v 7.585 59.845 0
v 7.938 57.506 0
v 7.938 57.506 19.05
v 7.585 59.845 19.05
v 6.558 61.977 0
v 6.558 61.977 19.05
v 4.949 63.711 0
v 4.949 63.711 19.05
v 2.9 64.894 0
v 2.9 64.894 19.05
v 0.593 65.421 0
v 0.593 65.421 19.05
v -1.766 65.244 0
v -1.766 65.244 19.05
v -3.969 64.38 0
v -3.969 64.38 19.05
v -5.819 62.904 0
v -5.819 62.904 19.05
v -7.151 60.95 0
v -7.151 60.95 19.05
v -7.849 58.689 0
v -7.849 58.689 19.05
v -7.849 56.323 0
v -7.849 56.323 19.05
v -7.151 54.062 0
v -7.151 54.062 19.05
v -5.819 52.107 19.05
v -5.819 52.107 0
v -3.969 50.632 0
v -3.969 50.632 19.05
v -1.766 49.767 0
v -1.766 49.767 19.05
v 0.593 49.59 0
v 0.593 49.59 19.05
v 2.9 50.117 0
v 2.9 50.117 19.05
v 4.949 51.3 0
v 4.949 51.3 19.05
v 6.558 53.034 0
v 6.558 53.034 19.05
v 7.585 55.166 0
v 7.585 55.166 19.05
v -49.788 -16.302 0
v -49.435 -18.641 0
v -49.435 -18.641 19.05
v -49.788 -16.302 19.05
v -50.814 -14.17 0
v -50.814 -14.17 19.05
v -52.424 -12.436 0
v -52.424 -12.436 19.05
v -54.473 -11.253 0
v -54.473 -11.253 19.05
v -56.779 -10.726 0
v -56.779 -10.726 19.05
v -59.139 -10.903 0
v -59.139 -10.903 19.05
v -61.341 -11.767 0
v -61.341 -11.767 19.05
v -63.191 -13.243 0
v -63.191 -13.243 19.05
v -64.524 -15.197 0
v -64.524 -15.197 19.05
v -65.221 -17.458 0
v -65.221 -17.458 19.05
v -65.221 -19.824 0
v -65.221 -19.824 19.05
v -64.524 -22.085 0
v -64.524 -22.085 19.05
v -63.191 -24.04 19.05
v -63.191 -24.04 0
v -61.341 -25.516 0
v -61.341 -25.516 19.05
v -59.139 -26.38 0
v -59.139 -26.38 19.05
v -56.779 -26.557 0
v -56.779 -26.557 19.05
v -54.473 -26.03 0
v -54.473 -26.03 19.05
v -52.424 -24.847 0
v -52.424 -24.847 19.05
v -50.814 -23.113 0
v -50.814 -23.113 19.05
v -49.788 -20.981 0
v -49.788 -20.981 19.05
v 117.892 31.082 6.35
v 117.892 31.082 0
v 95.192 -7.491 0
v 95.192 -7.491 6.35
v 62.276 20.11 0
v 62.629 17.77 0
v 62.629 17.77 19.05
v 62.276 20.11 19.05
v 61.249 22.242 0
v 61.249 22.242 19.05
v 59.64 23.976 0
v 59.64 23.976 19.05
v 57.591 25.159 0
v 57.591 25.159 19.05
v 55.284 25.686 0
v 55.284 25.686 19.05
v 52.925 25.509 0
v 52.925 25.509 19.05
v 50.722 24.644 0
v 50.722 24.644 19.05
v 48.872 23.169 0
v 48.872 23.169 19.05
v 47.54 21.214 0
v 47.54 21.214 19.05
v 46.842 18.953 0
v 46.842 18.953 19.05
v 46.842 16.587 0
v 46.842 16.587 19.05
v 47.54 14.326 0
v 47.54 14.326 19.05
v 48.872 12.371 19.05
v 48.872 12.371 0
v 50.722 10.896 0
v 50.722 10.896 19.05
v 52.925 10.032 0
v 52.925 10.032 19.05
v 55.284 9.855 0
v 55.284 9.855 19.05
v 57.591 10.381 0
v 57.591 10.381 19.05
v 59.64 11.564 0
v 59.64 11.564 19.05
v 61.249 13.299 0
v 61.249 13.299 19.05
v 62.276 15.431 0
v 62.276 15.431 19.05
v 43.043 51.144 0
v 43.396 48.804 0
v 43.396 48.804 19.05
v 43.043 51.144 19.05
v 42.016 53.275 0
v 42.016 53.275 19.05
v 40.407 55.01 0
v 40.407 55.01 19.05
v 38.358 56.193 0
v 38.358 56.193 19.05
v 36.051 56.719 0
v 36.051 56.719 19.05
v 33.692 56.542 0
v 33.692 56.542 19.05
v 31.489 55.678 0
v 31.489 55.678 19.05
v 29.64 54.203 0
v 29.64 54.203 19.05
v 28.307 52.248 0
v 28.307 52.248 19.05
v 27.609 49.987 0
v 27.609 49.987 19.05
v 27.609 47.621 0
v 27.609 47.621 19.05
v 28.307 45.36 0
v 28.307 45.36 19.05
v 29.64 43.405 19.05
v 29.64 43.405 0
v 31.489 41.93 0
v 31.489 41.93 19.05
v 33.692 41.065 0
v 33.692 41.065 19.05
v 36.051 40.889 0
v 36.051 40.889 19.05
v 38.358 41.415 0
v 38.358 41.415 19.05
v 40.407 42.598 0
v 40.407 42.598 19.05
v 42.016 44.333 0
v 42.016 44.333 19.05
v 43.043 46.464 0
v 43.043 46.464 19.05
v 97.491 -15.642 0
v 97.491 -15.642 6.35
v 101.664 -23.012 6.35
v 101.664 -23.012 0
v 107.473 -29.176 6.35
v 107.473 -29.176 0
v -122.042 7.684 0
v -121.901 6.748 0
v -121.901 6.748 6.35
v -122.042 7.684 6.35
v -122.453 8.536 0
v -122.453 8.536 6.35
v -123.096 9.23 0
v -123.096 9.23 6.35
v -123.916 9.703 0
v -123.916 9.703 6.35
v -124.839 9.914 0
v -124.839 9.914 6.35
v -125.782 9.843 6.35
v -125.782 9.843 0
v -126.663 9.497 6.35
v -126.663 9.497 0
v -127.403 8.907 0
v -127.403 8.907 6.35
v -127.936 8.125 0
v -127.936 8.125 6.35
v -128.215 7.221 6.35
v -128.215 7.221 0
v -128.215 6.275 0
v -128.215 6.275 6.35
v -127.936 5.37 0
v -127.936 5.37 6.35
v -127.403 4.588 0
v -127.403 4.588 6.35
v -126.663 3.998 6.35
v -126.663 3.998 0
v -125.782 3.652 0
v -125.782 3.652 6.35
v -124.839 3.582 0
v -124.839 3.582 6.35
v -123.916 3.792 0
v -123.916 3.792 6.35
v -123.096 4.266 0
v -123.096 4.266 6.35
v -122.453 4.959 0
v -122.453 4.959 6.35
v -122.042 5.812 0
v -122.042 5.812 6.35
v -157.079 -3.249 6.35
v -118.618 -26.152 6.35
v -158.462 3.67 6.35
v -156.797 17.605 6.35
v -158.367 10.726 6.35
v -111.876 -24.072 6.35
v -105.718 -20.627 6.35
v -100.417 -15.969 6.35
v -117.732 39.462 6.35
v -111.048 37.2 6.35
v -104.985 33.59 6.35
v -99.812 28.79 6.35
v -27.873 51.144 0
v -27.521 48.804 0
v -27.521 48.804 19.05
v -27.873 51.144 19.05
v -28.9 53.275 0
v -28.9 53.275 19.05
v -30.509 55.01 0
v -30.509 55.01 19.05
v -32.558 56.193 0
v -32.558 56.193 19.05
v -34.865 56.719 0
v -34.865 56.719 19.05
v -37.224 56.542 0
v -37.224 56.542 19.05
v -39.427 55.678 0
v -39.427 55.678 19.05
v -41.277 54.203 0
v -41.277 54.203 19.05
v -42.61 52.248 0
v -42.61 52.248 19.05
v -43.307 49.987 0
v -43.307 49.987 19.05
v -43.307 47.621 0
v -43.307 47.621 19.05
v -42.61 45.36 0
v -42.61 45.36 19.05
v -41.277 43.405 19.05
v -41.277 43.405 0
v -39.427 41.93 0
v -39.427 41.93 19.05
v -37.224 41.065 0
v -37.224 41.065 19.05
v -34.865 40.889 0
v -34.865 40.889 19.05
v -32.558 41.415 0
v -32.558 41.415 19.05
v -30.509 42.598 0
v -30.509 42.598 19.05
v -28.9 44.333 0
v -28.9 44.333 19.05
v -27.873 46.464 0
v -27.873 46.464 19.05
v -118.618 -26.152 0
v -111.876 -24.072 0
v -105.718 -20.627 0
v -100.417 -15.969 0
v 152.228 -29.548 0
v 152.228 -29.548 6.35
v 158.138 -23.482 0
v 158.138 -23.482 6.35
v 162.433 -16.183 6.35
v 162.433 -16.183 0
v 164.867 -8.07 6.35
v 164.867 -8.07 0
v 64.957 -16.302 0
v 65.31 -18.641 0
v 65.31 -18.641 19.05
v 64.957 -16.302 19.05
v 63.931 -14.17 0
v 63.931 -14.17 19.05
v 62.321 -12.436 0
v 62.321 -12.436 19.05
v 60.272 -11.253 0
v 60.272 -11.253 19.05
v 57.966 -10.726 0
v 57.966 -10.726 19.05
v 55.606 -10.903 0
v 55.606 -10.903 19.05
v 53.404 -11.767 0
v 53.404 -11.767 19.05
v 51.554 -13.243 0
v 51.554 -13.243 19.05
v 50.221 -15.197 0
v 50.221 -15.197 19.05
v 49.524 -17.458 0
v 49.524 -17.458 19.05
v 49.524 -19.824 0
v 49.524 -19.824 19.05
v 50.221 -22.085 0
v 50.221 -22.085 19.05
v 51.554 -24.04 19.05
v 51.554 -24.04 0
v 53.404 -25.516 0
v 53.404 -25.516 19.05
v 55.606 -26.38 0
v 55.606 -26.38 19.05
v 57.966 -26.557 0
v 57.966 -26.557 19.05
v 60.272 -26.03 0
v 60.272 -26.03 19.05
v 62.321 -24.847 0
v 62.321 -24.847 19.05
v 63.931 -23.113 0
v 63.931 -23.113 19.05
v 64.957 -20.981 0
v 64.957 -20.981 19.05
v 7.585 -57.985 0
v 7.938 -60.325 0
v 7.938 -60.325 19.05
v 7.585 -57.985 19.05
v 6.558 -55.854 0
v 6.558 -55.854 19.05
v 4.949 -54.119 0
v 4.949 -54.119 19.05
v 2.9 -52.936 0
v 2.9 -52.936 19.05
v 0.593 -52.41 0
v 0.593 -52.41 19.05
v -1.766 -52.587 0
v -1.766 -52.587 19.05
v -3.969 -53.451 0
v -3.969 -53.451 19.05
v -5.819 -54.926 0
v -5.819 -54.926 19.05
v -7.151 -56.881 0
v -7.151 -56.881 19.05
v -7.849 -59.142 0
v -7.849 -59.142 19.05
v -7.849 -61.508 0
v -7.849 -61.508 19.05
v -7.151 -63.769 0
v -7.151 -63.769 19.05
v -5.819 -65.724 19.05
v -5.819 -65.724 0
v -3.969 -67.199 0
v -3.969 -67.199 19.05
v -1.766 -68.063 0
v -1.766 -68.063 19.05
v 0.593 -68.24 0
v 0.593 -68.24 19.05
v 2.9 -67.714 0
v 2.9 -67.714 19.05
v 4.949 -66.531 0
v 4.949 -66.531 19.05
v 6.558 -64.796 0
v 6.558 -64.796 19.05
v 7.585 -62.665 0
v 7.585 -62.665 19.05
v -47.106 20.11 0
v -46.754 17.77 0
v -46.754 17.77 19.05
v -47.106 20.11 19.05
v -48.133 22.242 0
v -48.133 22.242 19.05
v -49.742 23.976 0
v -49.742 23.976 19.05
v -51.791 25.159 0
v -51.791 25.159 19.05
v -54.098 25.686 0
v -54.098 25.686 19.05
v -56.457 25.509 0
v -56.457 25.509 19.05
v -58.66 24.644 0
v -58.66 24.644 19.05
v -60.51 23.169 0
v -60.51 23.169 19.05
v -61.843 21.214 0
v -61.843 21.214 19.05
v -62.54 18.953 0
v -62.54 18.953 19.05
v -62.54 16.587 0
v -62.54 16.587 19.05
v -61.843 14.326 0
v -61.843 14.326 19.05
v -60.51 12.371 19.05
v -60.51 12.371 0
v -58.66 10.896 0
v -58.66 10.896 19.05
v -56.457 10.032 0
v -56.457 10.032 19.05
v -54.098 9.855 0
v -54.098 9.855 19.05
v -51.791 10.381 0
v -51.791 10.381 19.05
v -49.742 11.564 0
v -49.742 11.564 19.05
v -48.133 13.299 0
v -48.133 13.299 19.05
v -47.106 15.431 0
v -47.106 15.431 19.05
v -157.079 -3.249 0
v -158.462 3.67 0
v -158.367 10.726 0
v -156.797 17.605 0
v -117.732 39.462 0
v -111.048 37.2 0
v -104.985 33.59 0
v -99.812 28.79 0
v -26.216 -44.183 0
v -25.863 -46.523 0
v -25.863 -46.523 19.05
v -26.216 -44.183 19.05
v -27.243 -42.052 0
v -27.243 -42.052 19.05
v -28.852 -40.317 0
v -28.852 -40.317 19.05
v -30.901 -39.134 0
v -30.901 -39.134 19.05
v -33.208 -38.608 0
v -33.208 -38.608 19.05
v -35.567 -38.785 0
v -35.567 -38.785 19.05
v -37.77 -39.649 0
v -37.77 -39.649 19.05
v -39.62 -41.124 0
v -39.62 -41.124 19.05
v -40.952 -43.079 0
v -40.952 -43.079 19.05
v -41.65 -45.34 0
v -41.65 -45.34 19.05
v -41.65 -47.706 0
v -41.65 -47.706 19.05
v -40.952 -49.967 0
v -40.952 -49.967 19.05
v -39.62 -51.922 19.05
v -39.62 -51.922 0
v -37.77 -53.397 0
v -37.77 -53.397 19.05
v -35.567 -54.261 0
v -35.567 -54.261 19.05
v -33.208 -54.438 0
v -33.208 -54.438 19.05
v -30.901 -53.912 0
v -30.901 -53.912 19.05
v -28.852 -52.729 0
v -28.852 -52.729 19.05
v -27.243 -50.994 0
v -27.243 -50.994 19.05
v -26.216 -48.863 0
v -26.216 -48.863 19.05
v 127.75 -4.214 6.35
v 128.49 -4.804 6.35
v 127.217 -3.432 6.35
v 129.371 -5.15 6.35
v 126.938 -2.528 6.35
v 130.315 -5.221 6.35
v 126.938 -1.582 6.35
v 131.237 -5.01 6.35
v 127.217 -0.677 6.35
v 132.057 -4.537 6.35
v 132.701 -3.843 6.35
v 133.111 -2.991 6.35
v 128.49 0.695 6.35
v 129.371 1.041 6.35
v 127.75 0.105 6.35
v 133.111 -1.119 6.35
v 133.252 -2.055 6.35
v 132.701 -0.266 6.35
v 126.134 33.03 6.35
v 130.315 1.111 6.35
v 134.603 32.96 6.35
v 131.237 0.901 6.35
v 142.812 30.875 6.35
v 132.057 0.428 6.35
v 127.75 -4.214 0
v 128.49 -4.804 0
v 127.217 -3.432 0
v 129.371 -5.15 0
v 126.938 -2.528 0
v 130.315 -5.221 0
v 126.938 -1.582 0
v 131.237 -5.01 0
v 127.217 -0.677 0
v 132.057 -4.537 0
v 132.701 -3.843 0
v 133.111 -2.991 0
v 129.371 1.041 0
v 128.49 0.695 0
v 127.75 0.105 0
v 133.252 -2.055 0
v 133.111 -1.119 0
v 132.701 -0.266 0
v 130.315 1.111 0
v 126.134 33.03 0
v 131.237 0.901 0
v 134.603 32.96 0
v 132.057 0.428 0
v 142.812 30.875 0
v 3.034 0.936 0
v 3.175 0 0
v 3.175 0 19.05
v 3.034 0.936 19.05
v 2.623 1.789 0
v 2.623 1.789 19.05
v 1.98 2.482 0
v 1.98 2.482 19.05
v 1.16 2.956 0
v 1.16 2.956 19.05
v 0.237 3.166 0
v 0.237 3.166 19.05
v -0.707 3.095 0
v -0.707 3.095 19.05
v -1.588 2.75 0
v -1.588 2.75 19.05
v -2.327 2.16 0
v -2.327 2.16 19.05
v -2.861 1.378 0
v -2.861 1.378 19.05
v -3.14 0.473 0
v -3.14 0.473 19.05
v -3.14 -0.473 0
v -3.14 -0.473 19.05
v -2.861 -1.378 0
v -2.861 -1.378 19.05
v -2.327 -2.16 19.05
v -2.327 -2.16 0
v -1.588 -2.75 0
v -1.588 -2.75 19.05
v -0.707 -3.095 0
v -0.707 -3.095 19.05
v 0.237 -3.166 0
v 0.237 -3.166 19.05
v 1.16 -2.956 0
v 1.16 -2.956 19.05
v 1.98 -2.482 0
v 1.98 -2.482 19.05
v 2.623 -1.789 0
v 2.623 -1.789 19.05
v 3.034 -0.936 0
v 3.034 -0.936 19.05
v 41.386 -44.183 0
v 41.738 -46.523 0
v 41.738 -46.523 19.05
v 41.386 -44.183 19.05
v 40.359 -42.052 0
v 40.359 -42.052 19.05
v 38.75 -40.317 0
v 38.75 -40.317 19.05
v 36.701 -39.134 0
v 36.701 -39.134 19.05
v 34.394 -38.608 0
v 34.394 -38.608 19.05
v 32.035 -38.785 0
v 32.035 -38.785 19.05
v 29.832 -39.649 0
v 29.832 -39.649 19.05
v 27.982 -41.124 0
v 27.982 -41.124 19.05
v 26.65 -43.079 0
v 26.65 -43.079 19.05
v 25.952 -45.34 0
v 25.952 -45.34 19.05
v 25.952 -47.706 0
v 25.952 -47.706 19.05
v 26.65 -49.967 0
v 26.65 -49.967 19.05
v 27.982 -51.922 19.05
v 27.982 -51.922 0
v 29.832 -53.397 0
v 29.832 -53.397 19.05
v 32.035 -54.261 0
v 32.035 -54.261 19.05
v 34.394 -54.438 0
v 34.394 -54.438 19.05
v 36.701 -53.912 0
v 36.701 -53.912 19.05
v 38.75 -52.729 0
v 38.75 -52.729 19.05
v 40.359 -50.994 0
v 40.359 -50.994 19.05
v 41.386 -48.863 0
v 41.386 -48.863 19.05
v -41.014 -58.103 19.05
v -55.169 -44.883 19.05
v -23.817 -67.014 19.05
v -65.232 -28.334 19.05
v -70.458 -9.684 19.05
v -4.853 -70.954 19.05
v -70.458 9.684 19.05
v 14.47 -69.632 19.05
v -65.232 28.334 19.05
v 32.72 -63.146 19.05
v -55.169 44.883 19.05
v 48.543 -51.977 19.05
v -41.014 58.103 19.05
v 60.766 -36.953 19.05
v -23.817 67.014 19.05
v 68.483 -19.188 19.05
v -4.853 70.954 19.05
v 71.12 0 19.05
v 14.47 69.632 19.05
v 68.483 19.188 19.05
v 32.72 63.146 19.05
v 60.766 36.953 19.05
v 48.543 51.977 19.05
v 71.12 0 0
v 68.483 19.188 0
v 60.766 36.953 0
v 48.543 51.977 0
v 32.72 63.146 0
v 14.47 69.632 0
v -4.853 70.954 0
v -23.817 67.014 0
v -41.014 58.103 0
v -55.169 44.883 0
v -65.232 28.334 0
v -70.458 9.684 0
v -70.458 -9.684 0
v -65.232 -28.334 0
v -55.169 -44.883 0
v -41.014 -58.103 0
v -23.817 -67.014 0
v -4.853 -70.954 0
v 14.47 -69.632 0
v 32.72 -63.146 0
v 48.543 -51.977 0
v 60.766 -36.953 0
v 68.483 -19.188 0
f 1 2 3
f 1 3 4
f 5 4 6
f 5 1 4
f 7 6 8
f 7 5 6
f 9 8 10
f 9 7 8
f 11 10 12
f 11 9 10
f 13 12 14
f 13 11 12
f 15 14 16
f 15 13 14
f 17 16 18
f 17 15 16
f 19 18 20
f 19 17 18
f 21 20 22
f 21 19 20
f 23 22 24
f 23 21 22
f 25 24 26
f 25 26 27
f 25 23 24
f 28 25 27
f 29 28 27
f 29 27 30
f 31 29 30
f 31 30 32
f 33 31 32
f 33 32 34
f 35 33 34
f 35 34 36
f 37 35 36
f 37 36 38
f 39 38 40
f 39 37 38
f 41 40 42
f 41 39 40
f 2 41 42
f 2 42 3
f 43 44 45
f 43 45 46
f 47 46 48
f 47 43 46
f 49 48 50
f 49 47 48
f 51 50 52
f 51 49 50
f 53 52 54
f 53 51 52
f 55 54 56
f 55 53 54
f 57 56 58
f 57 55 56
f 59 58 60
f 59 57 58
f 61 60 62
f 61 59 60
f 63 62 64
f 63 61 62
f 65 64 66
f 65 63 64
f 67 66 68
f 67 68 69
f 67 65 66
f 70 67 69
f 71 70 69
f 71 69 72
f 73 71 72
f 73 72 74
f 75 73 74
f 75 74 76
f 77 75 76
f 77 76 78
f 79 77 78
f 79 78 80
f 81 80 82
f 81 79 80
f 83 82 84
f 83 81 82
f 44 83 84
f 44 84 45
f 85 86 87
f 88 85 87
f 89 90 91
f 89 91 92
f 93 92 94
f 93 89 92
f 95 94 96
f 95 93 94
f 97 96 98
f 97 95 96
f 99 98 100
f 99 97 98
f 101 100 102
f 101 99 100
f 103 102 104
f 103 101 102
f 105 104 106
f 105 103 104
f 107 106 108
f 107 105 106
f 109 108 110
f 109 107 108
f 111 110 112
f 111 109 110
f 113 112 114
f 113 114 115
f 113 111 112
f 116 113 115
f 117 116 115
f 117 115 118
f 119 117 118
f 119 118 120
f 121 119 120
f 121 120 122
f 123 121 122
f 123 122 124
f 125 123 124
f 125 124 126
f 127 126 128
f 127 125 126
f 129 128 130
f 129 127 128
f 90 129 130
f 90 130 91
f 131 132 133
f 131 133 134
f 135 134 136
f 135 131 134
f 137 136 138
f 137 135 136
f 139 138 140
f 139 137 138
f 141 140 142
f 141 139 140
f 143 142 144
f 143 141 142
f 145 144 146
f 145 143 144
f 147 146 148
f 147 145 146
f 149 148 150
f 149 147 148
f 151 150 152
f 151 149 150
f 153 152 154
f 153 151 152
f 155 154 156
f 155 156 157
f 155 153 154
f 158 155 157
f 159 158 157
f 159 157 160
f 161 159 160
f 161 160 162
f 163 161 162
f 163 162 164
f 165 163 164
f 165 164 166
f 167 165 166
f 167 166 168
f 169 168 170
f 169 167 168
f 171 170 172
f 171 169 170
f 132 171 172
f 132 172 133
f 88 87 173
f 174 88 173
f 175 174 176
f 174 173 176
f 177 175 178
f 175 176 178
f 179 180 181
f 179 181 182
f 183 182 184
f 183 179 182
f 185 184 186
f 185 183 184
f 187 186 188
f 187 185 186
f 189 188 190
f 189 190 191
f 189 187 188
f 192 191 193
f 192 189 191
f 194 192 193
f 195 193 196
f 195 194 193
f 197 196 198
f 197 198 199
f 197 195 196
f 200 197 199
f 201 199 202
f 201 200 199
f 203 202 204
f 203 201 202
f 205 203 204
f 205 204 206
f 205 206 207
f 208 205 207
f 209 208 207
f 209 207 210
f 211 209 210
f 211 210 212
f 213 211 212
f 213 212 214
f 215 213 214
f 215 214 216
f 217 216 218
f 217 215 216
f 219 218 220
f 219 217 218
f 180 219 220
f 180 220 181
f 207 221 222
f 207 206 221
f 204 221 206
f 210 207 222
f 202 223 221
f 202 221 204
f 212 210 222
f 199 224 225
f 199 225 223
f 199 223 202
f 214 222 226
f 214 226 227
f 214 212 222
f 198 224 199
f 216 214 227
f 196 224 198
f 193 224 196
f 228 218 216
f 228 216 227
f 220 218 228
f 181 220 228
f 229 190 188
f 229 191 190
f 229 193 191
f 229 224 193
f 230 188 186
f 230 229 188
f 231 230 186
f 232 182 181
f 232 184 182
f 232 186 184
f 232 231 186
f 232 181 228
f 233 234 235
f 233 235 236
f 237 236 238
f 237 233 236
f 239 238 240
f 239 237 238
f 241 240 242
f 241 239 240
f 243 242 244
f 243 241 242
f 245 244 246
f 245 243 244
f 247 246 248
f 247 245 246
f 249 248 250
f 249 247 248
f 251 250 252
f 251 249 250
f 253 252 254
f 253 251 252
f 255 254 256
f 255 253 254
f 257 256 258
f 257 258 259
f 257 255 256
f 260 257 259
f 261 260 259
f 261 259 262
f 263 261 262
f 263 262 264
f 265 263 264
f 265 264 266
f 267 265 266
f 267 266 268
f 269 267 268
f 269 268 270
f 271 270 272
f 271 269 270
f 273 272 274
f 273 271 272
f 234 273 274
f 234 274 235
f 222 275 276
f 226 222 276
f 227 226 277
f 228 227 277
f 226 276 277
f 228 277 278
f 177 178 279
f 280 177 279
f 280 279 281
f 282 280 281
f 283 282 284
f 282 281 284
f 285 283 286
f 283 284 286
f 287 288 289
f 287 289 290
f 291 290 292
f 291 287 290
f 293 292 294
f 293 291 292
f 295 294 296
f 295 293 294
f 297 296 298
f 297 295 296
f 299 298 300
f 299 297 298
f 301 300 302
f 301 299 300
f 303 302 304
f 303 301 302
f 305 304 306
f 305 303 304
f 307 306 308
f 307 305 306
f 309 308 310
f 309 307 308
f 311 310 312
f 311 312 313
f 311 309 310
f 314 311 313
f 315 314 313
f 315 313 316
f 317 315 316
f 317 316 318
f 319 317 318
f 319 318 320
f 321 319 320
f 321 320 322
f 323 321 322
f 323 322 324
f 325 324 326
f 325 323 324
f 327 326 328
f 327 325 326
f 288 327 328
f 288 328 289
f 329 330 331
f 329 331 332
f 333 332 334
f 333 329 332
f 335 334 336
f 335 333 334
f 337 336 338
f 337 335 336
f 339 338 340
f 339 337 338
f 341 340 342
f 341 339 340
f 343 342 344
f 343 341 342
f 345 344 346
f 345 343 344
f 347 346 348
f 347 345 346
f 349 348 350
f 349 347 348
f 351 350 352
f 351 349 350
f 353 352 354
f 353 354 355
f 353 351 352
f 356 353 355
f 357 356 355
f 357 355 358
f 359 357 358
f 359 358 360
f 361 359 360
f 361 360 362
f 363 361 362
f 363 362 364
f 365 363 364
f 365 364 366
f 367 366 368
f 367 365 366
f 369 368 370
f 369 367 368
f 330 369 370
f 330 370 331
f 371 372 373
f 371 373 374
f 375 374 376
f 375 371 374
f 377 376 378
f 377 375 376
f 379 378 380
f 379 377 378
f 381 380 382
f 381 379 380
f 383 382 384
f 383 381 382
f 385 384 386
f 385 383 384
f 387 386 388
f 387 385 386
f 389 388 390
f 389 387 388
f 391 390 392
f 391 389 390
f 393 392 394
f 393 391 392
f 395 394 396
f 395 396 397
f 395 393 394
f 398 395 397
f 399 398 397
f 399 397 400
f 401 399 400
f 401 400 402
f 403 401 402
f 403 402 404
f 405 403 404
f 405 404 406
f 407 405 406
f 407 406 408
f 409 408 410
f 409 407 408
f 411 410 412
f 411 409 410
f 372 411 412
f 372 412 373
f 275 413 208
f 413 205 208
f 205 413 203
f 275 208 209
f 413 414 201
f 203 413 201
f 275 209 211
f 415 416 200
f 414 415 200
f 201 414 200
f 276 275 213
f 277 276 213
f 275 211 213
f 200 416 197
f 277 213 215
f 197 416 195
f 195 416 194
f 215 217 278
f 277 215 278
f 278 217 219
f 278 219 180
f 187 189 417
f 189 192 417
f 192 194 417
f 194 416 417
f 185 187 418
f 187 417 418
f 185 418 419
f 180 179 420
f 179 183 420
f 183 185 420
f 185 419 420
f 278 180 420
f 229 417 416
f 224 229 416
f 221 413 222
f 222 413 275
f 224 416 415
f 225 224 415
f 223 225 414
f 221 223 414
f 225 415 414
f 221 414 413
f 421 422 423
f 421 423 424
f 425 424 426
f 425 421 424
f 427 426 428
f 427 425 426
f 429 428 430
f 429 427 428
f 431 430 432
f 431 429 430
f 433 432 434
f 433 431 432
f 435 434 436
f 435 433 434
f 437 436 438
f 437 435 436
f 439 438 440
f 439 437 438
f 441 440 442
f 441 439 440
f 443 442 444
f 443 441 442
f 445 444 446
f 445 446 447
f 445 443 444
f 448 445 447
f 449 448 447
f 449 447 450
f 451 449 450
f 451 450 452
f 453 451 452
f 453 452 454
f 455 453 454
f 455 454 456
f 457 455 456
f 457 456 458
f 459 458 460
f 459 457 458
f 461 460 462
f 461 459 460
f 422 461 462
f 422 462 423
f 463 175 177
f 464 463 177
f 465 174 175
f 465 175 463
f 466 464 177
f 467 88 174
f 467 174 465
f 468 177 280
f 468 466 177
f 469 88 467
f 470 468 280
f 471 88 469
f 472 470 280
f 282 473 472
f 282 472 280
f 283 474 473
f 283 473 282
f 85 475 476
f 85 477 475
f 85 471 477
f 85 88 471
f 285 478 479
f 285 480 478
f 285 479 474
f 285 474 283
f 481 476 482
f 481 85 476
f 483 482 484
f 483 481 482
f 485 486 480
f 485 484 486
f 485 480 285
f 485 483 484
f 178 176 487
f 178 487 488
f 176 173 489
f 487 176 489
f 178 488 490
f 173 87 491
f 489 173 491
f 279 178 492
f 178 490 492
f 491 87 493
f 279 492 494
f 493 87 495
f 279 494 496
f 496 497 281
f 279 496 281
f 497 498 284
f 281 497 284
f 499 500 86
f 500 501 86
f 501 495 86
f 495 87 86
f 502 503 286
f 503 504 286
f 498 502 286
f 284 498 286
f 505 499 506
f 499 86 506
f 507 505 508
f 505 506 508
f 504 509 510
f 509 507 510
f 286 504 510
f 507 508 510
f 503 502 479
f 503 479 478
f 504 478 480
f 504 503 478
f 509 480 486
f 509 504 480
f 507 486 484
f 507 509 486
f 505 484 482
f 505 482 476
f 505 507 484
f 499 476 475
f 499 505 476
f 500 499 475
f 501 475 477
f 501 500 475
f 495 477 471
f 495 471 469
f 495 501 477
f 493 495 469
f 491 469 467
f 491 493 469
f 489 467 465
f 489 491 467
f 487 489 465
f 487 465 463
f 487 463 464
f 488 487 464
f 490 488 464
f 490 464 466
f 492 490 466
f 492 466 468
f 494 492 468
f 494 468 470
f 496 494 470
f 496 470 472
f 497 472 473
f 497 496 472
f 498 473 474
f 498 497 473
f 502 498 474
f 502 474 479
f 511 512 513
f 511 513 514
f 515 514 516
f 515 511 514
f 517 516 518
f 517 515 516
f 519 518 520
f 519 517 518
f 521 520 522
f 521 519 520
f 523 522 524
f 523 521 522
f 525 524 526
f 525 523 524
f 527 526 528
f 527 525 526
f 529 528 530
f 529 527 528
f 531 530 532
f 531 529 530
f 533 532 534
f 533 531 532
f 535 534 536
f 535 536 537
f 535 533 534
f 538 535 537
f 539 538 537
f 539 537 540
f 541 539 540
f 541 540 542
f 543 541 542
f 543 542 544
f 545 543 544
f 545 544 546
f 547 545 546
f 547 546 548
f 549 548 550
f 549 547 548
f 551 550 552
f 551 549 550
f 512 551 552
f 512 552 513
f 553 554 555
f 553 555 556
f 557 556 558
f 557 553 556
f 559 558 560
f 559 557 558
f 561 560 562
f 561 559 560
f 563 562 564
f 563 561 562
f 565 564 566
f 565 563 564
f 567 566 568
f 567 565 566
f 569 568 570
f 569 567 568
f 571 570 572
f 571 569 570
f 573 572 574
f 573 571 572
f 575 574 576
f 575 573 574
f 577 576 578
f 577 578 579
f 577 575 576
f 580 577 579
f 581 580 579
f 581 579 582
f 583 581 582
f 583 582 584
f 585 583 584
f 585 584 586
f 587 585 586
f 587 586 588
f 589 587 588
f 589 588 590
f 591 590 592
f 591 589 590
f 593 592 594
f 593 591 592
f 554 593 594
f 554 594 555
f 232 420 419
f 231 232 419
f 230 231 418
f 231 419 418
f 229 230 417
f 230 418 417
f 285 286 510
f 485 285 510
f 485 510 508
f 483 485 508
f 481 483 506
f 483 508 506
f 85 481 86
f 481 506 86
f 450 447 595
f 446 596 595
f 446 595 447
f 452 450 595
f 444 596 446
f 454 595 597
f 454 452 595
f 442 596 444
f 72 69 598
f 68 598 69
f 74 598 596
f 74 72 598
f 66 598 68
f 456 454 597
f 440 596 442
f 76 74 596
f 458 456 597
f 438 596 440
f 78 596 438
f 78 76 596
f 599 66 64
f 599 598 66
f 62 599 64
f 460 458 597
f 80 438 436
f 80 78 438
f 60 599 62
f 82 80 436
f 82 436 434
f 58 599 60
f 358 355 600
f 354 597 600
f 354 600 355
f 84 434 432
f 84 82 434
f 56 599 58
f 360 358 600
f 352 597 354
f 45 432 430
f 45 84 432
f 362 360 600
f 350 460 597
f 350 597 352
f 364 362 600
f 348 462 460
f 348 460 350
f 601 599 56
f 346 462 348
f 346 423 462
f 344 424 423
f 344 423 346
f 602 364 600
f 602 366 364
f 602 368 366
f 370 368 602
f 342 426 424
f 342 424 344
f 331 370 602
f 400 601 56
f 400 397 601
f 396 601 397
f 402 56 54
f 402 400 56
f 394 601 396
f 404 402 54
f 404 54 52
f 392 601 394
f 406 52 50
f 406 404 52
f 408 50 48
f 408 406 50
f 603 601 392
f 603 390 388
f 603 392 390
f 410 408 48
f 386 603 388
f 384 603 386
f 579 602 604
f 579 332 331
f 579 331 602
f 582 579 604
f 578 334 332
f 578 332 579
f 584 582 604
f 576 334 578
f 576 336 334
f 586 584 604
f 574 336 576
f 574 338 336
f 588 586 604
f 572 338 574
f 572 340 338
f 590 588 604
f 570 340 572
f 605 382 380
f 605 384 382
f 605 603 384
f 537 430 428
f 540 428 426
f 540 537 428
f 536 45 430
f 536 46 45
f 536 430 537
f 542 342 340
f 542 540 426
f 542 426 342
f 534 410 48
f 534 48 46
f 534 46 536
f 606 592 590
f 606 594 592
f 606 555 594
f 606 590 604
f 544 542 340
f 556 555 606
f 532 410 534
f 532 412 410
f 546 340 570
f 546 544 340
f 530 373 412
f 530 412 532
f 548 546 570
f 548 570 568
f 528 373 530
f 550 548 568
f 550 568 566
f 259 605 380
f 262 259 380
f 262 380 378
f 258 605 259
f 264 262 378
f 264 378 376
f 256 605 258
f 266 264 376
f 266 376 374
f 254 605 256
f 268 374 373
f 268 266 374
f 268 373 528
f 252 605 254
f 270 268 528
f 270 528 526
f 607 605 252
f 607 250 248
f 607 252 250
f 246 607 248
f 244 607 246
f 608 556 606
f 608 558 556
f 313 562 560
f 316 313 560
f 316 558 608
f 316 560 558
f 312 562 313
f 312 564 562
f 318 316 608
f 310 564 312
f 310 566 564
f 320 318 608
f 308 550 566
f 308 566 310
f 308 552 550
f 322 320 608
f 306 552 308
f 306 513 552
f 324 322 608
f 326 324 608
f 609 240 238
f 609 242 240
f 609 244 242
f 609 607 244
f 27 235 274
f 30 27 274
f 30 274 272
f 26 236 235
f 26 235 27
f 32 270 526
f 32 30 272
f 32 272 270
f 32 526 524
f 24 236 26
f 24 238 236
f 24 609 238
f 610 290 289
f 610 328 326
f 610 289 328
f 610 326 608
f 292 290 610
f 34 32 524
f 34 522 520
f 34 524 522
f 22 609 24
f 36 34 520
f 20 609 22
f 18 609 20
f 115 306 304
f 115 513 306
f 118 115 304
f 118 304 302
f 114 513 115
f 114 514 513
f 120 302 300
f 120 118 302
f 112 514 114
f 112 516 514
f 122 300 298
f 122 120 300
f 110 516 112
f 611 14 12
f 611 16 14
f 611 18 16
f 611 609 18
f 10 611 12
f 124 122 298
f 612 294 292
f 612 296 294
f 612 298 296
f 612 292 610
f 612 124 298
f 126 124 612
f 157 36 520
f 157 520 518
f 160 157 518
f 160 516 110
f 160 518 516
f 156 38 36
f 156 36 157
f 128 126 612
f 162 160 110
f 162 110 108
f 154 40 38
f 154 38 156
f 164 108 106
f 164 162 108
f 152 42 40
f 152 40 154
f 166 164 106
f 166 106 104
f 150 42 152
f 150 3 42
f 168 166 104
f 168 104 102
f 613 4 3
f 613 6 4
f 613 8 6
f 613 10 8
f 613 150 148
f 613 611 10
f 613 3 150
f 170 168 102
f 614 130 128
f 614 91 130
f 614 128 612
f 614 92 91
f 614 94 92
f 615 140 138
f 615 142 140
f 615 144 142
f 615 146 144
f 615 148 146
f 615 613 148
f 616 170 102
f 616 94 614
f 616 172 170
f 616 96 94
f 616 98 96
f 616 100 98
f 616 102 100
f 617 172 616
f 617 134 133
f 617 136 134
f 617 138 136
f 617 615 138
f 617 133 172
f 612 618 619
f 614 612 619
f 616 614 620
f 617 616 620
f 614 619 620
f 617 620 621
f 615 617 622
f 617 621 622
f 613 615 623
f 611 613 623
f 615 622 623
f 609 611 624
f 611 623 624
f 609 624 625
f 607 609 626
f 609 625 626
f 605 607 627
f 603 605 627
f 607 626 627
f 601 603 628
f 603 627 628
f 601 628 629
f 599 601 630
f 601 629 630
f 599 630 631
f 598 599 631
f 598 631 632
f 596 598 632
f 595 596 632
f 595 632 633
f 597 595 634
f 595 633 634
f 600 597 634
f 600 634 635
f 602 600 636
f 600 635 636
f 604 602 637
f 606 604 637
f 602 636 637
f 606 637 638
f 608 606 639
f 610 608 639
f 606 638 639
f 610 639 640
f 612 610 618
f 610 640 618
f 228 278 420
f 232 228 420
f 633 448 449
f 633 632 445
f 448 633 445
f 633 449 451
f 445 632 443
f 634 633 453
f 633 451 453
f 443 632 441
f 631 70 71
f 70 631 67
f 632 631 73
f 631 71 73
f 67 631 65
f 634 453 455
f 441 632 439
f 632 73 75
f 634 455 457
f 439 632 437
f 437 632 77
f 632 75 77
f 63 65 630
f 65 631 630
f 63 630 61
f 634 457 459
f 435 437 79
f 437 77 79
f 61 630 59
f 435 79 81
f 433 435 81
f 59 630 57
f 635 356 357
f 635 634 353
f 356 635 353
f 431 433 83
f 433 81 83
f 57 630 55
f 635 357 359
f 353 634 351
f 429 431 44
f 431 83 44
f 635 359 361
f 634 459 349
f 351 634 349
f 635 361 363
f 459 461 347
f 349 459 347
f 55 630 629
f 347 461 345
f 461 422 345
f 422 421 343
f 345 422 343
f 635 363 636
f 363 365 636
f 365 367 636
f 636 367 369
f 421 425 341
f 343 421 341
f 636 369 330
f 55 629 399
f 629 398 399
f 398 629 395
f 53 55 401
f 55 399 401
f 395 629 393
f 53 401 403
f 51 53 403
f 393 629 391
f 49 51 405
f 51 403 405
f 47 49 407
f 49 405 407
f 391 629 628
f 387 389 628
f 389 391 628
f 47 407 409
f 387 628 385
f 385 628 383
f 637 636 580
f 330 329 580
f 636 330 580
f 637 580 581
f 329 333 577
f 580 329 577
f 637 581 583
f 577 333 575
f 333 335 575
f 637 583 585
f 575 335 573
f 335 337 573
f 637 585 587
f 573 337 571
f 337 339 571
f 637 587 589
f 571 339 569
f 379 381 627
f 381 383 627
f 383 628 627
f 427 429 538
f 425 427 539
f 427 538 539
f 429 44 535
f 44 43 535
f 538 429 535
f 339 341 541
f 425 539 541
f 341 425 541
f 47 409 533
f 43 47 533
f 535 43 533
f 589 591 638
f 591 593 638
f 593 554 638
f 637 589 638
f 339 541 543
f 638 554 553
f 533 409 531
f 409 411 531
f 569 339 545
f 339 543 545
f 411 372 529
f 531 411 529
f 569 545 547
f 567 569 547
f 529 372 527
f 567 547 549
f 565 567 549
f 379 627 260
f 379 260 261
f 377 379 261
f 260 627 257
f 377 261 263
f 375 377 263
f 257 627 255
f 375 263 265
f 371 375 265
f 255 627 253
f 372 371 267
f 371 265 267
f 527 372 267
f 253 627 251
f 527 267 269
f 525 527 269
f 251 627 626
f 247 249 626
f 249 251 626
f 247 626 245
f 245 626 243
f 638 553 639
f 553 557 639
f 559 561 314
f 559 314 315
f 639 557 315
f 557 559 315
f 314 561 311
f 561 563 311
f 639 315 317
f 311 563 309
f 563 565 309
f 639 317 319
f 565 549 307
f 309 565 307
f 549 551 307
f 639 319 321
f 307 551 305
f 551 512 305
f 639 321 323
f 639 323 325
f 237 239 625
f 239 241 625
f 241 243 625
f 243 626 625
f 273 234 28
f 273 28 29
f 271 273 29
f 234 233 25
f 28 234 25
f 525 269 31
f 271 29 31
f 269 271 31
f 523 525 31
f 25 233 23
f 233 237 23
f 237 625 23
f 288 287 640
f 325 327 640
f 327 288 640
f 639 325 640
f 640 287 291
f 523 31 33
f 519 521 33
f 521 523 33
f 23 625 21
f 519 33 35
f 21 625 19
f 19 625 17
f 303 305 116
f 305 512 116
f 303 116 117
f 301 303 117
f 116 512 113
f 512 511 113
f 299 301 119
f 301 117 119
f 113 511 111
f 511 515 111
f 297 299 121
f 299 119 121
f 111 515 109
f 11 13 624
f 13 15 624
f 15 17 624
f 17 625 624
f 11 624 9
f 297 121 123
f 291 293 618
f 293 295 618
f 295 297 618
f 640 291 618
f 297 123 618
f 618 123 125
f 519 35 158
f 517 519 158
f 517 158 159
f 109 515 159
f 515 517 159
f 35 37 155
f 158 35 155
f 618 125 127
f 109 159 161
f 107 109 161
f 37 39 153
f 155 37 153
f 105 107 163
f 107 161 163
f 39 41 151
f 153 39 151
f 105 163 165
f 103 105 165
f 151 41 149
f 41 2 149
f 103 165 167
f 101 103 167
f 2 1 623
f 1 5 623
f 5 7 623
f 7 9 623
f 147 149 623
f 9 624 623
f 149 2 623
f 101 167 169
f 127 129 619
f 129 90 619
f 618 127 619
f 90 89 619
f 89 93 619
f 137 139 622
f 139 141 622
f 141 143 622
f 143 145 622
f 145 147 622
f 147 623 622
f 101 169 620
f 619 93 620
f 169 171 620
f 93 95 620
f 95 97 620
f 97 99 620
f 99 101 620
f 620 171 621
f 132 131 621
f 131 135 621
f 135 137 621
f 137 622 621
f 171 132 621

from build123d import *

# Parameters (mm, degrees)
F0_R     = 71.12
F0_R_2   = 7.9375
F0_R_3   = 3.175
F2_DEPTH = 19.05
F1_R     = 3.175
F3_DEPTH = 6.35


with BuildPart() as f2:
    # F0 (on Top) → F2 (new body)
    with BuildSketch(Plane.XY):
        Circle(F0_R)
        with Locations((0, -60.325)):
            Circle(F0_R_2, mode=Mode.SUBTRACT)
        with Locations((-33.800944, -46.523008)):
            Circle(F0_R_2, mode=Mode.SUBTRACT)
        with Locations((-57.372484, -18.64145)):
            Circle(F0_R_2, mode=Mode.SUBTRACT)
        Circle(F0_R_3, mode=Mode.SUBTRACT)
        with Locations((33.800944, -46.523008)):
            Circle(F0_R_2, mode=Mode.SUBTRACT)
        with Locations((57.372484, -18.64145)):
            Circle(F0_R_2, mode=Mode.SUBTRACT)
        with Locations((-54.691076, 17.770208)):
            Circle(F0_R_2, mode=Mode.SUBTRACT)
        with Locations((-35.458145, 48.80395)):
            Circle(F0_R_2, mode=Mode.SUBTRACT)
        with Locations((0, 57.5056)):
            Circle(F0_R_2, mode=Mode.SUBTRACT)
        with Locations((54.691076, 17.770208)):
            Circle(F0_R_2, mode=Mode.SUBTRACT)
        with Locations((35.458145, 48.80395)):
            Circle(F0_R_2, mode=Mode.SUBTRACT)
    extrude(amount=F2_DEPTH)


with BuildPart() as f3:
    # F1 (on Top) → F3 (new body)
    with BuildSketch(Plane.XY):
        with BuildLine():
            Line((-117.731759, 39.461601), (-156.797144, 17.605455))
            ThreePointArc((-156.797144, 17.605455), (-158.600817, 7.200762), (-157.078891, -3.248861))
            Line((-157.078891, -3.248861), (-118.618221, -26.152404))
            ThreePointArc((-118.618221, -26.152404), (-108.705656, -22.512084), (-100.41698, -15.969246))
            Line((-100.41698, -15.969246), (-99.812265, 28.790443))
            ThreePointArc((-99.812265, 28.790443), (-107.921157, 35.554816), (-117.731759, 39.461601))
        make_face()
        with Locations((-125.075877, 6.747831)):
            Circle(F1_R, mode=Mode.SUBTRACT)
        with BuildLine():
            Line((117.892078, 31.081786), (95.192351, -7.490912))
            ThreePointArc((95.192351, -7.490912), (99.3557, -19.452918), (107.472845, -29.175832))
            Line((107.472845, -29.175832), (152.227645, -29.548023))
            ThreePointArc((152.227645, -29.548023), (160.505371, -19.961453), (164.867089, -8.070343))
            Line((164.867089, -8.070343), (142.812016, 30.874546))
            ThreePointArc((142.812016, 30.874546), (130.37094, 33.249983), (117.892078, 31.081786))
        make_face()
        with Locations((130.077337, -2.054796)):
            Circle(F1_R, mode=Mode.SUBTRACT)
    extrude(amount=F3_DEPTH)


solid = Compound([f2.part, f3.part])
